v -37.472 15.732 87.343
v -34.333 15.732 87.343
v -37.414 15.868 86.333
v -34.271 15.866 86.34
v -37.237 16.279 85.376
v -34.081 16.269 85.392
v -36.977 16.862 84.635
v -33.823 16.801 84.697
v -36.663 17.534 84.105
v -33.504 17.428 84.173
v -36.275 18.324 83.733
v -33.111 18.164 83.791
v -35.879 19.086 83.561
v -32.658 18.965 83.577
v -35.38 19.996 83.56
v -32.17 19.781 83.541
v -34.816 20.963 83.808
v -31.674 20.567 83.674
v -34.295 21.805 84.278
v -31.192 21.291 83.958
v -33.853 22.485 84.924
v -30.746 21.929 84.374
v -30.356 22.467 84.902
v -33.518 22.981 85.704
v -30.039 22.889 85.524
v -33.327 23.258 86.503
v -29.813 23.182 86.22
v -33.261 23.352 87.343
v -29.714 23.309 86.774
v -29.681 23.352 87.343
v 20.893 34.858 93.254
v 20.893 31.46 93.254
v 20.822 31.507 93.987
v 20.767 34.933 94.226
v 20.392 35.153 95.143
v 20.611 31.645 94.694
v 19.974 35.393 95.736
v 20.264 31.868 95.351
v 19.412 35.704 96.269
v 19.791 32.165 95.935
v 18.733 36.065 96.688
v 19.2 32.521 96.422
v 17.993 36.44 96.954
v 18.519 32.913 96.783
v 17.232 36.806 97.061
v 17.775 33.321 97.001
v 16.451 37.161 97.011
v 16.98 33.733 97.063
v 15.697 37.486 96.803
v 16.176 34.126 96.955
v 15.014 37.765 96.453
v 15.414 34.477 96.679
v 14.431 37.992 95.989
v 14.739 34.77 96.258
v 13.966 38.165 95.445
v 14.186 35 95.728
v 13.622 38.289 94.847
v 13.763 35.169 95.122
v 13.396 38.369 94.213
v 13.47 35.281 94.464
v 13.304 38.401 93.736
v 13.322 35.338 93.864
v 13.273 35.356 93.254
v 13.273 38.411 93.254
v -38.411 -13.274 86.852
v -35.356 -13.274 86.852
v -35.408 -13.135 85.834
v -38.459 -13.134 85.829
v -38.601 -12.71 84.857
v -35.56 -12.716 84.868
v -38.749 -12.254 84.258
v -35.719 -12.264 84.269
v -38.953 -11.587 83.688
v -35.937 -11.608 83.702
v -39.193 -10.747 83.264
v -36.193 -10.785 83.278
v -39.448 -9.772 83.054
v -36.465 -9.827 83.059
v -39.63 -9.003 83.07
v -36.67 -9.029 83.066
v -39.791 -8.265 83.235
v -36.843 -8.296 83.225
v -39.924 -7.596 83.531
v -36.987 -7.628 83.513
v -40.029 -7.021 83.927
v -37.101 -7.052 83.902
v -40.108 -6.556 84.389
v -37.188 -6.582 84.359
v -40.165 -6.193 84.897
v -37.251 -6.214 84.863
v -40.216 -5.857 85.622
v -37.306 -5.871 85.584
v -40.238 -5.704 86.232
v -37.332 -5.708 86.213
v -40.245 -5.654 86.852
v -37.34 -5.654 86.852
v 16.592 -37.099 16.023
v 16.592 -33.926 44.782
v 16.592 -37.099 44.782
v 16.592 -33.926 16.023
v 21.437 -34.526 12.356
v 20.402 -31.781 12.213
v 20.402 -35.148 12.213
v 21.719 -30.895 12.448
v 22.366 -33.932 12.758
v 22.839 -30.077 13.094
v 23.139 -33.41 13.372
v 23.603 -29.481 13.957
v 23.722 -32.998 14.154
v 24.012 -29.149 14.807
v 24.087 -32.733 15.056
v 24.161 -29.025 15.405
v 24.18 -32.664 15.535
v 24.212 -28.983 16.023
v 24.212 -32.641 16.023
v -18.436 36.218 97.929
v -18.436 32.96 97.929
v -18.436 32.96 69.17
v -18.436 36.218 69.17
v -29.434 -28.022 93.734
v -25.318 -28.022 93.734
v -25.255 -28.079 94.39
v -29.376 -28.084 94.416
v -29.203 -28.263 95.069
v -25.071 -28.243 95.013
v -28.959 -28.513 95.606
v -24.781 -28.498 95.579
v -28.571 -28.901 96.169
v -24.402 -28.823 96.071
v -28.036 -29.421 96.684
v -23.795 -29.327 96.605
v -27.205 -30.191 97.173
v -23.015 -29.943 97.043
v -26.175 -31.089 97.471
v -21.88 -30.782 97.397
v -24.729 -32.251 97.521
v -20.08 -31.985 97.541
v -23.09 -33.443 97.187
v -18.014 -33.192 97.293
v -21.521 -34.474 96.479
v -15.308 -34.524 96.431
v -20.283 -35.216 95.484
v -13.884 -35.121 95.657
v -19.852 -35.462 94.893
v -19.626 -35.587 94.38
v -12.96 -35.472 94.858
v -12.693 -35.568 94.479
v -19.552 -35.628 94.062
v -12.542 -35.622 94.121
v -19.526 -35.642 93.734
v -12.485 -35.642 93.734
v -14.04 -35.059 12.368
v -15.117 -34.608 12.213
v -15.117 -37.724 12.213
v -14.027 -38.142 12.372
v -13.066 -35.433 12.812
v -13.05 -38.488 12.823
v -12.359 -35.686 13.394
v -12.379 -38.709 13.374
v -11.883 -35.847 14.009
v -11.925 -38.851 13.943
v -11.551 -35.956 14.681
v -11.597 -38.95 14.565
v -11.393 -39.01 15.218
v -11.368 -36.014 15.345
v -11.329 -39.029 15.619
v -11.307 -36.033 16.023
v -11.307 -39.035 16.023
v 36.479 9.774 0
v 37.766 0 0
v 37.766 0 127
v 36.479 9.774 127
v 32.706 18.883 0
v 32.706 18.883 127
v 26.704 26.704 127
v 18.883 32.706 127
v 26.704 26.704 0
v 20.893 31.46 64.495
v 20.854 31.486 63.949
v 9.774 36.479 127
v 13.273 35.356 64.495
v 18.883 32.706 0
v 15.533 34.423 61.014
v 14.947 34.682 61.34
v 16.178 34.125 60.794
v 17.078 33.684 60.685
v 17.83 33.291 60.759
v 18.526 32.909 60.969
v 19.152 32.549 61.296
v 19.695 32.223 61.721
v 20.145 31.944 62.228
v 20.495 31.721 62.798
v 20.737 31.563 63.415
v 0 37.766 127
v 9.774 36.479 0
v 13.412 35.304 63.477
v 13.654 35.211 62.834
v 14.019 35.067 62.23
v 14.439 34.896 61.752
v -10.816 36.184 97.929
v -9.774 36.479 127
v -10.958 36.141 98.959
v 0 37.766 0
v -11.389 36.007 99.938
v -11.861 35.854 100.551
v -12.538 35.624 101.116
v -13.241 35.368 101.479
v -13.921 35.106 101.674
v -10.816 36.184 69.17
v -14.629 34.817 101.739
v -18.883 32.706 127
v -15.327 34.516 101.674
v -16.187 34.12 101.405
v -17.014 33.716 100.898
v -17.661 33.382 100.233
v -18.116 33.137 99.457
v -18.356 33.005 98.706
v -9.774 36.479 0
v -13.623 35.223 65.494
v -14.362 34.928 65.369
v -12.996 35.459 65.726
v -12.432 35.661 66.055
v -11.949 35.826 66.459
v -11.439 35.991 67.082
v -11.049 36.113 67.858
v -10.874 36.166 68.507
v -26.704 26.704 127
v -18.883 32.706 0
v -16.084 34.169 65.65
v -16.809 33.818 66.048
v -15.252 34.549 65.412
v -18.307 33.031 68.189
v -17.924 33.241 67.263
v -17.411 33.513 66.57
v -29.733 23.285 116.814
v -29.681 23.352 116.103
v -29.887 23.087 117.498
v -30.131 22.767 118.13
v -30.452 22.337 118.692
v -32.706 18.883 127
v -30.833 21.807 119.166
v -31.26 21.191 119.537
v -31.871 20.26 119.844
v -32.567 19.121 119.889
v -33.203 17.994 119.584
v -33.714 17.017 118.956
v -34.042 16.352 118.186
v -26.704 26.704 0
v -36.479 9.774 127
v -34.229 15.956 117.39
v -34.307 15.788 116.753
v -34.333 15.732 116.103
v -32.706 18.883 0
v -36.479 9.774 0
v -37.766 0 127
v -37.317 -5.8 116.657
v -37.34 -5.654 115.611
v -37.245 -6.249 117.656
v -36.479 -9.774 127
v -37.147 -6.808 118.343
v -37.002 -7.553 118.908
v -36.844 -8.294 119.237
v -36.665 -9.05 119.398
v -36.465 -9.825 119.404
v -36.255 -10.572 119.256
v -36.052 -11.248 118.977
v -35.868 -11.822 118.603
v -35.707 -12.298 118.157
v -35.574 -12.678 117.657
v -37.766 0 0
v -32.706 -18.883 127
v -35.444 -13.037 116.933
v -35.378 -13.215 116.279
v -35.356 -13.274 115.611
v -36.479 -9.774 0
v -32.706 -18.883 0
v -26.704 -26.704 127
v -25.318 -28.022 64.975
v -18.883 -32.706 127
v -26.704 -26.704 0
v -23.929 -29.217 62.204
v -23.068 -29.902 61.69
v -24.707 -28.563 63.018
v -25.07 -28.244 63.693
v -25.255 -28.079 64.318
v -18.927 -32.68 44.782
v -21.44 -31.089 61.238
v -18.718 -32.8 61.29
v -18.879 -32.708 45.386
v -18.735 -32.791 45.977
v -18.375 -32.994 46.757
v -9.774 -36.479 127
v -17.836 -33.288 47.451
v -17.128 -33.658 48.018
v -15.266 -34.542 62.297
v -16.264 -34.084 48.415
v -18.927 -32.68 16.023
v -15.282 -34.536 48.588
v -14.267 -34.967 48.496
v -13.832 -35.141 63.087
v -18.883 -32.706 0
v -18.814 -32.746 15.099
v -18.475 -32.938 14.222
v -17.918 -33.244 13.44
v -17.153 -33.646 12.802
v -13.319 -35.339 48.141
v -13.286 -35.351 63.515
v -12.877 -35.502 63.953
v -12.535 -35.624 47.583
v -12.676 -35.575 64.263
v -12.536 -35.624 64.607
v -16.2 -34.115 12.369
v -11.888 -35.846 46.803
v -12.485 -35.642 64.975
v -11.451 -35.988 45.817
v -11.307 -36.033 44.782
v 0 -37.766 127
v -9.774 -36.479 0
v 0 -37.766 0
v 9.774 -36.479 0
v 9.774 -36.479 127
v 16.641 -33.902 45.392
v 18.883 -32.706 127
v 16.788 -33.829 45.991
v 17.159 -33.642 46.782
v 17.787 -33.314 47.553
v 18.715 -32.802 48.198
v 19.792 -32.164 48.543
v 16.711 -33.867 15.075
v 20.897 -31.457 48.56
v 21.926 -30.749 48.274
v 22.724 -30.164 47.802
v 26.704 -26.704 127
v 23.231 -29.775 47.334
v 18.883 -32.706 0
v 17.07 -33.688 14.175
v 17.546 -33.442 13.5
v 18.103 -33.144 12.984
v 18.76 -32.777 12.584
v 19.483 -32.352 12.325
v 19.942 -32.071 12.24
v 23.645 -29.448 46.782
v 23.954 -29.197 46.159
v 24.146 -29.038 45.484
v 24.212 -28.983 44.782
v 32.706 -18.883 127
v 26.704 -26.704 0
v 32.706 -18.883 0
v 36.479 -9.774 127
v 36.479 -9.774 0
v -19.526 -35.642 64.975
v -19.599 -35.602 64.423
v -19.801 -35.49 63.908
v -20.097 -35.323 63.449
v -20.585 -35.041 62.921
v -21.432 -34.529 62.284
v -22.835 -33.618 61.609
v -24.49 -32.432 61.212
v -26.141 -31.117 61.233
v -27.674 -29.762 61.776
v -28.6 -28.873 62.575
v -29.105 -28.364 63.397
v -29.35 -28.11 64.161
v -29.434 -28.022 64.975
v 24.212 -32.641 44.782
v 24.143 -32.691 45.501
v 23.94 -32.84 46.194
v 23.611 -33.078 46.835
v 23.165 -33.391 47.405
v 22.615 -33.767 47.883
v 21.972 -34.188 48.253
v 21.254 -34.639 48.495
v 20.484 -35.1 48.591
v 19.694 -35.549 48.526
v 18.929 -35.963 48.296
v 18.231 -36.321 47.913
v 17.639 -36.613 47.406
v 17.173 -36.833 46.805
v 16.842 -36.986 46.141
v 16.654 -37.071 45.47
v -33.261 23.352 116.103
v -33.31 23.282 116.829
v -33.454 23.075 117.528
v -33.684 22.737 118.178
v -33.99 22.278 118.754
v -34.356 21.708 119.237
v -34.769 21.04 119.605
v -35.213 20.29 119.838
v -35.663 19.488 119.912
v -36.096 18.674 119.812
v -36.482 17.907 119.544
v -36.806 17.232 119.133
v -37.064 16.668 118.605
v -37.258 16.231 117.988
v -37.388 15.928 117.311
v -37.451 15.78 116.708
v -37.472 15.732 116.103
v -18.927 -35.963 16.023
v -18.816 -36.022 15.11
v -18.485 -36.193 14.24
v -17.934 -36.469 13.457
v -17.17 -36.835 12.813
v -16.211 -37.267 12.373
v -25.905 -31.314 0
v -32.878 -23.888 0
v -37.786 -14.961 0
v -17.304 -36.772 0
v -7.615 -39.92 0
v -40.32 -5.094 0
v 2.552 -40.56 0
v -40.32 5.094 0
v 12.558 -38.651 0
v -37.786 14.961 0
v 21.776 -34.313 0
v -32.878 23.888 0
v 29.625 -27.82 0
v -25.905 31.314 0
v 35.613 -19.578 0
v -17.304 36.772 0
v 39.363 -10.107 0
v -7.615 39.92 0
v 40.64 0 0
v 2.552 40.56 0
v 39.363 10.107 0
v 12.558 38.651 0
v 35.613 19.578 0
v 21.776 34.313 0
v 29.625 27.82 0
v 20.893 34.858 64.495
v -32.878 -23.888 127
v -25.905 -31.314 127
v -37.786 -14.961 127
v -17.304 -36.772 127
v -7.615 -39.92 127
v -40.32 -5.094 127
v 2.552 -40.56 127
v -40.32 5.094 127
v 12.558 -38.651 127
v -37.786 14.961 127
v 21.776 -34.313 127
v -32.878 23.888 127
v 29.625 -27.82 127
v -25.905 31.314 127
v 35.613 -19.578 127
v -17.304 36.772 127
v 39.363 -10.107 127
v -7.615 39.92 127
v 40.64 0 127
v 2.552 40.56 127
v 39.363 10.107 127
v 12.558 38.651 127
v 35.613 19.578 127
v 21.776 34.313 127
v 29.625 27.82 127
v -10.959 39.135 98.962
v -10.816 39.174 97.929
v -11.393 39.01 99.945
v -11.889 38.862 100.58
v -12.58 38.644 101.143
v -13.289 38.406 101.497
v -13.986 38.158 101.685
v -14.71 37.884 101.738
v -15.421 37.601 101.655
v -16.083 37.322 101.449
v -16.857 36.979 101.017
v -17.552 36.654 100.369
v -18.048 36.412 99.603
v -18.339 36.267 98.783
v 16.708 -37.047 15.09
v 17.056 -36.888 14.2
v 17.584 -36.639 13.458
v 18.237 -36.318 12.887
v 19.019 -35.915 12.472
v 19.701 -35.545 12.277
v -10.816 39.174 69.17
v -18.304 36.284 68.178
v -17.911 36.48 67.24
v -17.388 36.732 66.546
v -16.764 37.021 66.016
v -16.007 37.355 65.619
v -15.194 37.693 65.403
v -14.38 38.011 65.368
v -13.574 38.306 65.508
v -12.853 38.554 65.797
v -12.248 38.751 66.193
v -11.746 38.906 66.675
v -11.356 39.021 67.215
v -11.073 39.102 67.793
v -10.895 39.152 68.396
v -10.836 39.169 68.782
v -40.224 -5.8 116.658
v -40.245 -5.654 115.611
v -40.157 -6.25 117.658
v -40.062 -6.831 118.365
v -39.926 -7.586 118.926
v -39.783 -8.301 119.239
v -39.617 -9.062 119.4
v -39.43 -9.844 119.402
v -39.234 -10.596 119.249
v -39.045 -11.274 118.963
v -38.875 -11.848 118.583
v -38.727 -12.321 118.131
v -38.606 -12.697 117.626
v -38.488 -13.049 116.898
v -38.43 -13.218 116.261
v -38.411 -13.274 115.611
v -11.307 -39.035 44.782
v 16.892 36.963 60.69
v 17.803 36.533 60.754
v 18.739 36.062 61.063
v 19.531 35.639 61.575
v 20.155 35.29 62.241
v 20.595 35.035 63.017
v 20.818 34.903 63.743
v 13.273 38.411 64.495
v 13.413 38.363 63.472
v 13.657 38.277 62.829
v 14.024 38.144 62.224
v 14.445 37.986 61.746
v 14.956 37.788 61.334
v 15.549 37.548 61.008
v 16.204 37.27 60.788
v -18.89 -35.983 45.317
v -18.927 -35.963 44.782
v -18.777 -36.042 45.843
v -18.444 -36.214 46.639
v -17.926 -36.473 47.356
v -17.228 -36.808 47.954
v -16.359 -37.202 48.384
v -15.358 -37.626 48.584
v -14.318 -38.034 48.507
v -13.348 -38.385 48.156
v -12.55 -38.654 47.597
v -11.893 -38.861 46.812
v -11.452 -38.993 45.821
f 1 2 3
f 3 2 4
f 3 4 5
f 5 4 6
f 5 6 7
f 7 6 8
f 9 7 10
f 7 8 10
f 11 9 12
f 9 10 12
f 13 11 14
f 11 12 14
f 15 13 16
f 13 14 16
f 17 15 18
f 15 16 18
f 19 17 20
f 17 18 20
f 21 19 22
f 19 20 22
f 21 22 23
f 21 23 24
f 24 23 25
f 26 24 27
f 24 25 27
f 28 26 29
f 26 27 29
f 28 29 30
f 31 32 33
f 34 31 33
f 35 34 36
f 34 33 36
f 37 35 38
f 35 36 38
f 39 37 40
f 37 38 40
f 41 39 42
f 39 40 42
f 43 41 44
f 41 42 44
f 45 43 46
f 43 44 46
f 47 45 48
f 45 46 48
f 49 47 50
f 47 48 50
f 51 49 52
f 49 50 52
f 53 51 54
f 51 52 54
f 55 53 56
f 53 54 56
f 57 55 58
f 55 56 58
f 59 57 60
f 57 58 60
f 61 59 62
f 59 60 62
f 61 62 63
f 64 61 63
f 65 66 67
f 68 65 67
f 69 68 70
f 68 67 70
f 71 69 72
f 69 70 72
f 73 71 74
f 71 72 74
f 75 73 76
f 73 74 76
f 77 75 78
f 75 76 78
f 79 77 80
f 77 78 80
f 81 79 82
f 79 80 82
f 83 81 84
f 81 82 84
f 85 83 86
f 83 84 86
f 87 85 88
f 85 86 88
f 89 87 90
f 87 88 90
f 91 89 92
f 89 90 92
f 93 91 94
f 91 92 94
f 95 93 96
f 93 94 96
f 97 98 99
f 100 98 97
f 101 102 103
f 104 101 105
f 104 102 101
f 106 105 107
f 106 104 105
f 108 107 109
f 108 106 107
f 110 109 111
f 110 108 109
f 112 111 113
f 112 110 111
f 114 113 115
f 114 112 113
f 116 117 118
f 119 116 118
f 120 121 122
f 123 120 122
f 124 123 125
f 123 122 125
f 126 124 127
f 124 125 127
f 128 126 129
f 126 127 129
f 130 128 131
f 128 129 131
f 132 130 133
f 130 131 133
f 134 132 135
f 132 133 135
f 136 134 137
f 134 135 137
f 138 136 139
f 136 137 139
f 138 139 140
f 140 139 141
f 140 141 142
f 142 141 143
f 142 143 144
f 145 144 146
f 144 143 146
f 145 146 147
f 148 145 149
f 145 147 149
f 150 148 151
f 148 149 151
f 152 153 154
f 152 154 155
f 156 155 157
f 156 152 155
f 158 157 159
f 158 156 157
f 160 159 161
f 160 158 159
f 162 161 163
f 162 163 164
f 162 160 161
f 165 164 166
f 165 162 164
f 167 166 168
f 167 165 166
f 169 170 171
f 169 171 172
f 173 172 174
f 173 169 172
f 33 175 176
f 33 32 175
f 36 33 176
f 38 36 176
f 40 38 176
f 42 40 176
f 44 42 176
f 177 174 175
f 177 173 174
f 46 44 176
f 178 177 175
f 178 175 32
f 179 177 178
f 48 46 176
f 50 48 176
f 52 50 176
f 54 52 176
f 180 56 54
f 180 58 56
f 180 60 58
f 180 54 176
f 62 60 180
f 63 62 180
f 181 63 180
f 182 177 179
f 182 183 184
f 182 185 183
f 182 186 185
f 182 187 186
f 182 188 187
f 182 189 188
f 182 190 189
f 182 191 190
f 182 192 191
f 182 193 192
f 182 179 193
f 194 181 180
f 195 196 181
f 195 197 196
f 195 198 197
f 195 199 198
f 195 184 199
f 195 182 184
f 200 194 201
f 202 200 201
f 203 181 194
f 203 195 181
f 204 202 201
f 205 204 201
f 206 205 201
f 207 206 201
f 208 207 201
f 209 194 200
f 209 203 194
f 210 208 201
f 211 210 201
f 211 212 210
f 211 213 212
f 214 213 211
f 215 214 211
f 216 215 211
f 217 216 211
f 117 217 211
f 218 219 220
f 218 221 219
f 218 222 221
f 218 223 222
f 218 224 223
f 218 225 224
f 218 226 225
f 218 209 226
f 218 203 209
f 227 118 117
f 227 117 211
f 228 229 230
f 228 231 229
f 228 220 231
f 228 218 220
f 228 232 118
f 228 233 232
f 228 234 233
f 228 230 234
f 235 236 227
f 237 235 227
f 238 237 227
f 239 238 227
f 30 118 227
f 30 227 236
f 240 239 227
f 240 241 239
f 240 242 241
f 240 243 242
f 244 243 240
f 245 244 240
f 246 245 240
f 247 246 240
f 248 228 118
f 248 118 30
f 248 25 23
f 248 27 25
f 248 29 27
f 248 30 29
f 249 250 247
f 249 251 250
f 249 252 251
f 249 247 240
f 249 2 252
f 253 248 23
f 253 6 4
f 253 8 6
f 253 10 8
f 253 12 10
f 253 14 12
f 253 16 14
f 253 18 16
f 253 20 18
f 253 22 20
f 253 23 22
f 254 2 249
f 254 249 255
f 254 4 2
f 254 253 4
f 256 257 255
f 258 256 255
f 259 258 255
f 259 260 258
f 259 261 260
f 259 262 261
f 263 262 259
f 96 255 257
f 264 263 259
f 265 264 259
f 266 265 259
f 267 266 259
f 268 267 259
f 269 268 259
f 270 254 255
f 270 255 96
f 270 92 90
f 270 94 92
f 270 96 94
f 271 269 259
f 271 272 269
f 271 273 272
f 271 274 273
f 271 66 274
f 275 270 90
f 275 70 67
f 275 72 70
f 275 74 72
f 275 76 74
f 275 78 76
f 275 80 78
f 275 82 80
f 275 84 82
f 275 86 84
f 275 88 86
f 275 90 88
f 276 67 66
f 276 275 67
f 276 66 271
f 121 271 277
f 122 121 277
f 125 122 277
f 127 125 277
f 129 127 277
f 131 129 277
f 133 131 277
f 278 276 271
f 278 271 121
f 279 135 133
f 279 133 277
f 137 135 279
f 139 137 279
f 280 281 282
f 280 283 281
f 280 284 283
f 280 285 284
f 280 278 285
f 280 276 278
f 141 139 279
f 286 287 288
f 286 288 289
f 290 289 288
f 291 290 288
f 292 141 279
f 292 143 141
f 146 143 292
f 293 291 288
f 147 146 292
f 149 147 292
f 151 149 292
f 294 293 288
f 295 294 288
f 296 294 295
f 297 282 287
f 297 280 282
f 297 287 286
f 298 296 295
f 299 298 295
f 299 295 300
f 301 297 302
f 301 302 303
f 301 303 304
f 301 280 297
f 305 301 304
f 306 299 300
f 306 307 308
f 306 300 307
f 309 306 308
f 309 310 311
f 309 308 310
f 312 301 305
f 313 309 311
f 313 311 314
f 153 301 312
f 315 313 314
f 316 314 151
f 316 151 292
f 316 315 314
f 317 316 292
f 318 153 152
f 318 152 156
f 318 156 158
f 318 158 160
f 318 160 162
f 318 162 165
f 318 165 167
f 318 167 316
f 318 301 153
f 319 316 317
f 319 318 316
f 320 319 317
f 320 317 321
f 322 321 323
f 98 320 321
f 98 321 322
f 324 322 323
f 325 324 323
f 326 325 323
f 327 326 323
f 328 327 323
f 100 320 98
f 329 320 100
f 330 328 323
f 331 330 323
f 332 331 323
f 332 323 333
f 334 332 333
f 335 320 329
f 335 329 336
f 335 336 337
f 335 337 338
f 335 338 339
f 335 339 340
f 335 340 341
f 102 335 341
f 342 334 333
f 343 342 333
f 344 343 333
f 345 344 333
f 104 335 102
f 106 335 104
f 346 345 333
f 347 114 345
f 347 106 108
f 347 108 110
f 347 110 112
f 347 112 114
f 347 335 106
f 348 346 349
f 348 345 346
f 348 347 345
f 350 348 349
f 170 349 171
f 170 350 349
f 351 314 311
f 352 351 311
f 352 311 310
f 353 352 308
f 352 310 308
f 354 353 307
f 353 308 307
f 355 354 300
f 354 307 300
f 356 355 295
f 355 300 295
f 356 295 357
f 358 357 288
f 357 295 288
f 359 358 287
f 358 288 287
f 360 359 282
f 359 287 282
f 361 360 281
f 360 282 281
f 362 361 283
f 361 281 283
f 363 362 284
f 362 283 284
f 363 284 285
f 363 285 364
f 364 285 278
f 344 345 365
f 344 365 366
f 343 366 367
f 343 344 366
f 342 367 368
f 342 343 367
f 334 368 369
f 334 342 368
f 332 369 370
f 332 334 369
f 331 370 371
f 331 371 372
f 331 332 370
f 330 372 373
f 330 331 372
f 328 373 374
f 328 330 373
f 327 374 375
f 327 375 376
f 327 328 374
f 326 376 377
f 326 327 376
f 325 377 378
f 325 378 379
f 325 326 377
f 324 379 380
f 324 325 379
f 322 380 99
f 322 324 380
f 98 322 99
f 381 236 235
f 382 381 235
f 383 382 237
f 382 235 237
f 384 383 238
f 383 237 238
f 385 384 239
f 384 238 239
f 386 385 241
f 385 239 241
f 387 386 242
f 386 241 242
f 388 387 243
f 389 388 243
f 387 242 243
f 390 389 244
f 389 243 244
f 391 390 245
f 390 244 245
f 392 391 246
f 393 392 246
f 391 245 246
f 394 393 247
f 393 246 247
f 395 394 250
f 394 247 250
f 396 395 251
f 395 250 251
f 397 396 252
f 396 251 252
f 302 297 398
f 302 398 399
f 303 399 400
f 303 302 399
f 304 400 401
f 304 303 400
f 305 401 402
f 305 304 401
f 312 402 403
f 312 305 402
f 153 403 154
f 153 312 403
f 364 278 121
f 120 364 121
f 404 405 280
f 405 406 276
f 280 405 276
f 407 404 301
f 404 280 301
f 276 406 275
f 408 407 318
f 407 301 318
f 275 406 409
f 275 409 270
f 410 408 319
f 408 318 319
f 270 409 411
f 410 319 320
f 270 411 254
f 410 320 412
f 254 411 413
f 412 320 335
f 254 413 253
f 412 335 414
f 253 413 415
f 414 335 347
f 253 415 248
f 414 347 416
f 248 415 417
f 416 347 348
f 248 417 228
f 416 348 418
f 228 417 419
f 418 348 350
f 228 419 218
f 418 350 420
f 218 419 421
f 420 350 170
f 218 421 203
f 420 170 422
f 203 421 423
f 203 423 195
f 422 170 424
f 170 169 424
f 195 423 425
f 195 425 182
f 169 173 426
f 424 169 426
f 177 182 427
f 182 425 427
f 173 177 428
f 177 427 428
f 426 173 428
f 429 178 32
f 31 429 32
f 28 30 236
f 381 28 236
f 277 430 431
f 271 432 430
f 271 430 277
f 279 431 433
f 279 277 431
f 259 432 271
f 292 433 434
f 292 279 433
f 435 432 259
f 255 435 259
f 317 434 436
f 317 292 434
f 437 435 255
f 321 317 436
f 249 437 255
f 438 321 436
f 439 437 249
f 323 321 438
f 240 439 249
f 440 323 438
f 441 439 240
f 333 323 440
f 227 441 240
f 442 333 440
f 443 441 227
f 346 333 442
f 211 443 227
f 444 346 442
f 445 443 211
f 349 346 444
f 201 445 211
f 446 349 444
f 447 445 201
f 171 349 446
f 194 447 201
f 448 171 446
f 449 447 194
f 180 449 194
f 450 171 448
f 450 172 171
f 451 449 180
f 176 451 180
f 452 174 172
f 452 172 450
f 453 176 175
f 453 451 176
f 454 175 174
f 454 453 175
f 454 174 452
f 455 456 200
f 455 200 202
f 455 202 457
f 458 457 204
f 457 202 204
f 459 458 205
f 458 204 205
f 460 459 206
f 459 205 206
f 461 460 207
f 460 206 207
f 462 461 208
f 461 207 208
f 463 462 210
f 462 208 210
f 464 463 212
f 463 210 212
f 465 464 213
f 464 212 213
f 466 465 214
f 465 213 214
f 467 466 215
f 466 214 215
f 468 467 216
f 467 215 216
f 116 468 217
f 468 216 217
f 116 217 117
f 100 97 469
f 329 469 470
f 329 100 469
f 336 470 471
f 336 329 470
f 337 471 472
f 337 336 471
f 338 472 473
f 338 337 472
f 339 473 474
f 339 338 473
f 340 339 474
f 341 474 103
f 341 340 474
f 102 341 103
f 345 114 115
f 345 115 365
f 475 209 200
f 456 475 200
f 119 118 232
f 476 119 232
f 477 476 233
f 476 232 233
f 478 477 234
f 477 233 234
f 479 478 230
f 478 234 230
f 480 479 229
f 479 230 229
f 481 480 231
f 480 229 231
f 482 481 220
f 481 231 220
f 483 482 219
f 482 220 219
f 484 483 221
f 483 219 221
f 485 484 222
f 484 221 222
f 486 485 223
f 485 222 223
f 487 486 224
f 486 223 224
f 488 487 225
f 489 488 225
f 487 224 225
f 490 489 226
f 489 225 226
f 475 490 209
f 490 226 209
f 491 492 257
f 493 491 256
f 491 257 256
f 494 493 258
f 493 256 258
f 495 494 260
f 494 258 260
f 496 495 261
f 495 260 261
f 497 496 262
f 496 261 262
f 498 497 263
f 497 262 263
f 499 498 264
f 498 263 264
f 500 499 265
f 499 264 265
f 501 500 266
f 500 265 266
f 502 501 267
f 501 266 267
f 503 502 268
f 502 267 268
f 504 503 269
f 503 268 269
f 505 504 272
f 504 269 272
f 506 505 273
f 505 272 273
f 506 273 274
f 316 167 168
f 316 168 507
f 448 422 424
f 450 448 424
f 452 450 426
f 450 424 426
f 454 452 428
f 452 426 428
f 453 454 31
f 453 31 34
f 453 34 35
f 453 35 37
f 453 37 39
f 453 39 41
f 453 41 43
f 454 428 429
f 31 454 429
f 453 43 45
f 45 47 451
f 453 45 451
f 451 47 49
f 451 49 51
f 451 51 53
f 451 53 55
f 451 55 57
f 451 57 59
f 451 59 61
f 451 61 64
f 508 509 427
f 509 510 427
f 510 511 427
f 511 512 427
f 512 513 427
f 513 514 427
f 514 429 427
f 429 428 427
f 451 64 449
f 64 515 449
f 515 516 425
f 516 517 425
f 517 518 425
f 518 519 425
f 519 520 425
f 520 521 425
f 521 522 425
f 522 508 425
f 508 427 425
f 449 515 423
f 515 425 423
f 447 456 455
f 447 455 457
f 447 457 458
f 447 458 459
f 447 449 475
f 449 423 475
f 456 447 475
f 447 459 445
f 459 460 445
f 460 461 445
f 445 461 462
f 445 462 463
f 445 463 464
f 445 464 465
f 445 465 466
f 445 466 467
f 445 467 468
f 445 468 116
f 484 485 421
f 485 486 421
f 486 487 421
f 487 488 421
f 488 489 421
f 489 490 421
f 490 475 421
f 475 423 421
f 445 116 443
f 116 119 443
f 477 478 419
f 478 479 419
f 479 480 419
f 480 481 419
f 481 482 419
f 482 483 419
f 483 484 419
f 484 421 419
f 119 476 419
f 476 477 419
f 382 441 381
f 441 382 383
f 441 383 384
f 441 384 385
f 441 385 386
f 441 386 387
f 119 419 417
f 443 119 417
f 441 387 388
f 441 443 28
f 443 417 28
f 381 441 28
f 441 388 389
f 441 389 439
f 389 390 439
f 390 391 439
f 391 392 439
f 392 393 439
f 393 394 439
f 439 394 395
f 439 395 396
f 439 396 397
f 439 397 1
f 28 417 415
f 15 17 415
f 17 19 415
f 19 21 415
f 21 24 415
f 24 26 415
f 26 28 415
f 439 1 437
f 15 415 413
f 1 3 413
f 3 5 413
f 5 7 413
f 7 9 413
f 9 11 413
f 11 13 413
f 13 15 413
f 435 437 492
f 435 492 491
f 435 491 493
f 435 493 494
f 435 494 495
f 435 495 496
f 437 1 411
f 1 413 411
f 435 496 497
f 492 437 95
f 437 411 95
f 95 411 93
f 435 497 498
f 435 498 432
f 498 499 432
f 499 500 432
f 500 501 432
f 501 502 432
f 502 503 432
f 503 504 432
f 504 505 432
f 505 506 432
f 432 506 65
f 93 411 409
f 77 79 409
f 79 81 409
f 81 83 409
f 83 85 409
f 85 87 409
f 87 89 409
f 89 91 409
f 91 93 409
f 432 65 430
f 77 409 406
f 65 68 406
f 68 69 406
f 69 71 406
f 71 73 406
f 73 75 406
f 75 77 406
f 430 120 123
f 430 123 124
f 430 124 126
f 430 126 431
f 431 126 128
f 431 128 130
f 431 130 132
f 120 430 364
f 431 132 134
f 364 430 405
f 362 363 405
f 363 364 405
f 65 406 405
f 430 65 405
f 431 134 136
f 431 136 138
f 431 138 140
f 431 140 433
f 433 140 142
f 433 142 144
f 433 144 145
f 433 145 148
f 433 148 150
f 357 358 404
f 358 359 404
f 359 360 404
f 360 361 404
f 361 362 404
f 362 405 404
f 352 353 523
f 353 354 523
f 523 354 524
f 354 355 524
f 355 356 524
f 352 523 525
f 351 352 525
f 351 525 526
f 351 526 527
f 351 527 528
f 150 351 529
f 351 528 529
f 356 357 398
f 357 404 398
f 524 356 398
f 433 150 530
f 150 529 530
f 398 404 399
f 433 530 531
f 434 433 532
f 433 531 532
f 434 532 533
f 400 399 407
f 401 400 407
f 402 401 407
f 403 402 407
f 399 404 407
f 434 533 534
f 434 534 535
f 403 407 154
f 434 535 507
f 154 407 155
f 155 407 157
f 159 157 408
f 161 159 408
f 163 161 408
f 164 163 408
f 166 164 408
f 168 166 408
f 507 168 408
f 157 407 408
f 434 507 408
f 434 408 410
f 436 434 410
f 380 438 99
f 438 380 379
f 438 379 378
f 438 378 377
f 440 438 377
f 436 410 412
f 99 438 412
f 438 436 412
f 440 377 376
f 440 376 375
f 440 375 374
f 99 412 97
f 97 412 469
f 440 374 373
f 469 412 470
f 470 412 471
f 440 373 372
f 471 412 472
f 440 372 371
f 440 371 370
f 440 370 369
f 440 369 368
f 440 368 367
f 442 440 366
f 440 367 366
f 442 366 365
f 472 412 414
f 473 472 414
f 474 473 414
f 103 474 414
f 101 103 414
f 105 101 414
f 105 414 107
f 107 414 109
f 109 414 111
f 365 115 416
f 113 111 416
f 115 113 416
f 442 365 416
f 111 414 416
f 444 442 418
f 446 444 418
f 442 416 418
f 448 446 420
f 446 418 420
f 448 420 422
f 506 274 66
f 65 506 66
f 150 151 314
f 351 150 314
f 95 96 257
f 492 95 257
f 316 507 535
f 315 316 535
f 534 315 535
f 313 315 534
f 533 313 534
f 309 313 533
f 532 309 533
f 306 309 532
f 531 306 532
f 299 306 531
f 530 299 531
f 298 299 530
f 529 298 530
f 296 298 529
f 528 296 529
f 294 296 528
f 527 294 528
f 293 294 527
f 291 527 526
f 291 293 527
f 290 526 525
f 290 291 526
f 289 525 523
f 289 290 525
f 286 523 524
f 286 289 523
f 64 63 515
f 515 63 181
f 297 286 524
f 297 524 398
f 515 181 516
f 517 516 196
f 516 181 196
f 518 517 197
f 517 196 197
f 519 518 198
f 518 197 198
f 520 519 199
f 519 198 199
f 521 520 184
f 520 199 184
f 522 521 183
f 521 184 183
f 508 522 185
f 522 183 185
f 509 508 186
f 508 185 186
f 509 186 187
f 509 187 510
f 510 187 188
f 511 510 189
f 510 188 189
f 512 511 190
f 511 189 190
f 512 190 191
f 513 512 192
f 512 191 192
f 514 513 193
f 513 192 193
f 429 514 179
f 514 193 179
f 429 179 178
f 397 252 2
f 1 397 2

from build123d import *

# Parameters (mm, degrees)
F0_R     = 40.64
F0_R_2   = 37.765528
F1_DEPTH = 127
F3_DEPTH = 40.641
F4_DEPTH = 76.2
F5_DEPTH = 50.8
F6_DEPTH = 50.8
F8_DEPTH = 50.8
F9_DEPTH = 50.8


with BuildPart() as f1:
    # F0 (on Top) → F1 (new body)
    with BuildSketch(Plane.XY):
        Circle(F0_R)
        Circle(F0_R_2, mode=Mode.SUBTRACT)
    extrude(amount=F1_DEPTH)

    # F2 (on Front) → F3 (cut, through all)
    with BuildSketch(Plane.XZ):
        with BuildLine():
            ThreePointArc((20.893278, 93.254258), (17.083276, 97.064259), (13.273275, 93.254258))
            Line((13.273275, 93.254258), (13.273275, 64.494903))
            ThreePointArc((13.273275, 64.494903), (17.083276, 60.684902), (20.893278, 64.494903))
            Line((20.893278, 64.494903), (20.893278, 93.254258))
        make_face()
    extrude(amount=-F3_DEPTH, mode=Mode.SUBTRACT)

    # F2 (on Front) → F4 (cut)
    with BuildSketch(Plane.XZ):
        with BuildLine():
            ThreePointArc((-10.815753, 97.929251), (-14.625754, 101.739253), (-18.435756, 97.929251))
            Line((-18.435756, 97.929251), (-18.435756, 69.169897))
            ThreePointArc((-18.435756, 69.169897), (-14.625754, 65.359895), (-10.815753, 69.169897))
            Line((-10.815753, 69.169897), (-10.815753, 97.929251))
        make_face()
    extrude(amount=-F4_DEPTH, mode=Mode.SUBTRACT)

    # F2 (on Front) → F5 (cut)
    with BuildSketch(Plane.XZ):
        with BuildLine():
            ThreePointArc((-18.927373, 16.02255), (-17.811449, 13.328472), (-15.117371, 12.212548))
            ThreePointArc((-15.117371, 12.212548), (-12.423293, 13.328472), (-11.307369, 16.02255))
            Line((-11.307369, 16.02255), (-11.307369, 44.781905))
            ThreePointArc((-11.307369, 44.781905), (-15.117371, 48.591906), (-18.927373, 44.781905))
            Line((-18.927373, 44.781905), (-18.927373, 16.02255))
        make_face()
    extrude(amount=F5_DEPTH, mode=Mode.SUBTRACT)

    # F2 (on Front) → F6 (cut)
    with BuildSketch(Plane.XZ):
        with BuildLine():
            ThreePointArc((24.211667, 44.781905), (20.401666, 48.591906), (16.591664, 44.781905))
            Line((16.591664, 44.781905), (16.591664, 16.02255))
            ThreePointArc((16.591664, 16.02255), (17.707588, 13.328472), (20.401666, 12.212548))
            ThreePointArc((20.401666, 12.212548), (23.095744, 13.328472), (24.211667, 16.02255))
            Line((24.211667, 16.02255), (24.211667, 44.781905))
        make_face()
    extrude(amount=F6_DEPTH, mode=Mode.SUBTRACT)

    # F7 (on Right) → F8 (cut)
    with BuildSketch(Plane.YZ):
        with BuildLine():
            ThreePointArc((-5.653547, 115.610962), (-9.463548, 119.420963), (-13.27355, 115.610962))
            Line((-13.27355, 115.610962), (-13.27355, 86.851607))
            ThreePointArc((-13.27355, 86.851607), (-9.463548, 83.041606), (-5.653547, 86.851607))
            Line((-5.653547, 86.851607), (-5.653547, 115.610962))
        make_face()
    extrude(amount=-F8_DEPTH, mode=Mode.SUBTRACT)

    # F7 (on Right) → F9 (cut)
    with BuildSketch(Plane.YZ):
        with BuildLine():
            ThreePointArc((-5.653547, 115.610962), (-9.463548, 119.420963), (-13.27355, 115.610962))
            Line((-13.27355, 115.610962), (-13.27355, 86.851607))
            ThreePointArc((-13.27355, 86.851607), (-9.463548, 83.041606), (-5.653547, 86.851607))
            Line((-5.653547, 86.851607), (-5.653547, 115.610962))
        make_face()
        with BuildLine():
            ThreePointArc((-28.021937, 93.734198), (-31.831939, 97.5442), (-35.64194, 93.734198))
            Line((-35.64194, 93.734198), (-35.64194, 64.974844))
            ThreePointArc((-35.64194, 64.974844), (-31.831939, 61.164842), (-28.021937, 64.974844))
            Line((-28.021937, 64.974844), (-28.021937, 93.734198))
        make_face()
        with BuildLine():
            ThreePointArc((23.351614, 116.102581), (19.541613, 119.912582), (15.731611, 116.102581))
            Line((15.731611, 116.102581), (15.731611, 87.343226))
            ThreePointArc((15.731611, 87.343226), (19.541613, 83.533225), (23.351614, 87.343226))
            Line((23.351614, 87.343226), (23.351614, 116.102581))
        make_face()
    extrude(amount=-F9_DEPTH, mode=Mode.SUBTRACT)


solid = f1.part
